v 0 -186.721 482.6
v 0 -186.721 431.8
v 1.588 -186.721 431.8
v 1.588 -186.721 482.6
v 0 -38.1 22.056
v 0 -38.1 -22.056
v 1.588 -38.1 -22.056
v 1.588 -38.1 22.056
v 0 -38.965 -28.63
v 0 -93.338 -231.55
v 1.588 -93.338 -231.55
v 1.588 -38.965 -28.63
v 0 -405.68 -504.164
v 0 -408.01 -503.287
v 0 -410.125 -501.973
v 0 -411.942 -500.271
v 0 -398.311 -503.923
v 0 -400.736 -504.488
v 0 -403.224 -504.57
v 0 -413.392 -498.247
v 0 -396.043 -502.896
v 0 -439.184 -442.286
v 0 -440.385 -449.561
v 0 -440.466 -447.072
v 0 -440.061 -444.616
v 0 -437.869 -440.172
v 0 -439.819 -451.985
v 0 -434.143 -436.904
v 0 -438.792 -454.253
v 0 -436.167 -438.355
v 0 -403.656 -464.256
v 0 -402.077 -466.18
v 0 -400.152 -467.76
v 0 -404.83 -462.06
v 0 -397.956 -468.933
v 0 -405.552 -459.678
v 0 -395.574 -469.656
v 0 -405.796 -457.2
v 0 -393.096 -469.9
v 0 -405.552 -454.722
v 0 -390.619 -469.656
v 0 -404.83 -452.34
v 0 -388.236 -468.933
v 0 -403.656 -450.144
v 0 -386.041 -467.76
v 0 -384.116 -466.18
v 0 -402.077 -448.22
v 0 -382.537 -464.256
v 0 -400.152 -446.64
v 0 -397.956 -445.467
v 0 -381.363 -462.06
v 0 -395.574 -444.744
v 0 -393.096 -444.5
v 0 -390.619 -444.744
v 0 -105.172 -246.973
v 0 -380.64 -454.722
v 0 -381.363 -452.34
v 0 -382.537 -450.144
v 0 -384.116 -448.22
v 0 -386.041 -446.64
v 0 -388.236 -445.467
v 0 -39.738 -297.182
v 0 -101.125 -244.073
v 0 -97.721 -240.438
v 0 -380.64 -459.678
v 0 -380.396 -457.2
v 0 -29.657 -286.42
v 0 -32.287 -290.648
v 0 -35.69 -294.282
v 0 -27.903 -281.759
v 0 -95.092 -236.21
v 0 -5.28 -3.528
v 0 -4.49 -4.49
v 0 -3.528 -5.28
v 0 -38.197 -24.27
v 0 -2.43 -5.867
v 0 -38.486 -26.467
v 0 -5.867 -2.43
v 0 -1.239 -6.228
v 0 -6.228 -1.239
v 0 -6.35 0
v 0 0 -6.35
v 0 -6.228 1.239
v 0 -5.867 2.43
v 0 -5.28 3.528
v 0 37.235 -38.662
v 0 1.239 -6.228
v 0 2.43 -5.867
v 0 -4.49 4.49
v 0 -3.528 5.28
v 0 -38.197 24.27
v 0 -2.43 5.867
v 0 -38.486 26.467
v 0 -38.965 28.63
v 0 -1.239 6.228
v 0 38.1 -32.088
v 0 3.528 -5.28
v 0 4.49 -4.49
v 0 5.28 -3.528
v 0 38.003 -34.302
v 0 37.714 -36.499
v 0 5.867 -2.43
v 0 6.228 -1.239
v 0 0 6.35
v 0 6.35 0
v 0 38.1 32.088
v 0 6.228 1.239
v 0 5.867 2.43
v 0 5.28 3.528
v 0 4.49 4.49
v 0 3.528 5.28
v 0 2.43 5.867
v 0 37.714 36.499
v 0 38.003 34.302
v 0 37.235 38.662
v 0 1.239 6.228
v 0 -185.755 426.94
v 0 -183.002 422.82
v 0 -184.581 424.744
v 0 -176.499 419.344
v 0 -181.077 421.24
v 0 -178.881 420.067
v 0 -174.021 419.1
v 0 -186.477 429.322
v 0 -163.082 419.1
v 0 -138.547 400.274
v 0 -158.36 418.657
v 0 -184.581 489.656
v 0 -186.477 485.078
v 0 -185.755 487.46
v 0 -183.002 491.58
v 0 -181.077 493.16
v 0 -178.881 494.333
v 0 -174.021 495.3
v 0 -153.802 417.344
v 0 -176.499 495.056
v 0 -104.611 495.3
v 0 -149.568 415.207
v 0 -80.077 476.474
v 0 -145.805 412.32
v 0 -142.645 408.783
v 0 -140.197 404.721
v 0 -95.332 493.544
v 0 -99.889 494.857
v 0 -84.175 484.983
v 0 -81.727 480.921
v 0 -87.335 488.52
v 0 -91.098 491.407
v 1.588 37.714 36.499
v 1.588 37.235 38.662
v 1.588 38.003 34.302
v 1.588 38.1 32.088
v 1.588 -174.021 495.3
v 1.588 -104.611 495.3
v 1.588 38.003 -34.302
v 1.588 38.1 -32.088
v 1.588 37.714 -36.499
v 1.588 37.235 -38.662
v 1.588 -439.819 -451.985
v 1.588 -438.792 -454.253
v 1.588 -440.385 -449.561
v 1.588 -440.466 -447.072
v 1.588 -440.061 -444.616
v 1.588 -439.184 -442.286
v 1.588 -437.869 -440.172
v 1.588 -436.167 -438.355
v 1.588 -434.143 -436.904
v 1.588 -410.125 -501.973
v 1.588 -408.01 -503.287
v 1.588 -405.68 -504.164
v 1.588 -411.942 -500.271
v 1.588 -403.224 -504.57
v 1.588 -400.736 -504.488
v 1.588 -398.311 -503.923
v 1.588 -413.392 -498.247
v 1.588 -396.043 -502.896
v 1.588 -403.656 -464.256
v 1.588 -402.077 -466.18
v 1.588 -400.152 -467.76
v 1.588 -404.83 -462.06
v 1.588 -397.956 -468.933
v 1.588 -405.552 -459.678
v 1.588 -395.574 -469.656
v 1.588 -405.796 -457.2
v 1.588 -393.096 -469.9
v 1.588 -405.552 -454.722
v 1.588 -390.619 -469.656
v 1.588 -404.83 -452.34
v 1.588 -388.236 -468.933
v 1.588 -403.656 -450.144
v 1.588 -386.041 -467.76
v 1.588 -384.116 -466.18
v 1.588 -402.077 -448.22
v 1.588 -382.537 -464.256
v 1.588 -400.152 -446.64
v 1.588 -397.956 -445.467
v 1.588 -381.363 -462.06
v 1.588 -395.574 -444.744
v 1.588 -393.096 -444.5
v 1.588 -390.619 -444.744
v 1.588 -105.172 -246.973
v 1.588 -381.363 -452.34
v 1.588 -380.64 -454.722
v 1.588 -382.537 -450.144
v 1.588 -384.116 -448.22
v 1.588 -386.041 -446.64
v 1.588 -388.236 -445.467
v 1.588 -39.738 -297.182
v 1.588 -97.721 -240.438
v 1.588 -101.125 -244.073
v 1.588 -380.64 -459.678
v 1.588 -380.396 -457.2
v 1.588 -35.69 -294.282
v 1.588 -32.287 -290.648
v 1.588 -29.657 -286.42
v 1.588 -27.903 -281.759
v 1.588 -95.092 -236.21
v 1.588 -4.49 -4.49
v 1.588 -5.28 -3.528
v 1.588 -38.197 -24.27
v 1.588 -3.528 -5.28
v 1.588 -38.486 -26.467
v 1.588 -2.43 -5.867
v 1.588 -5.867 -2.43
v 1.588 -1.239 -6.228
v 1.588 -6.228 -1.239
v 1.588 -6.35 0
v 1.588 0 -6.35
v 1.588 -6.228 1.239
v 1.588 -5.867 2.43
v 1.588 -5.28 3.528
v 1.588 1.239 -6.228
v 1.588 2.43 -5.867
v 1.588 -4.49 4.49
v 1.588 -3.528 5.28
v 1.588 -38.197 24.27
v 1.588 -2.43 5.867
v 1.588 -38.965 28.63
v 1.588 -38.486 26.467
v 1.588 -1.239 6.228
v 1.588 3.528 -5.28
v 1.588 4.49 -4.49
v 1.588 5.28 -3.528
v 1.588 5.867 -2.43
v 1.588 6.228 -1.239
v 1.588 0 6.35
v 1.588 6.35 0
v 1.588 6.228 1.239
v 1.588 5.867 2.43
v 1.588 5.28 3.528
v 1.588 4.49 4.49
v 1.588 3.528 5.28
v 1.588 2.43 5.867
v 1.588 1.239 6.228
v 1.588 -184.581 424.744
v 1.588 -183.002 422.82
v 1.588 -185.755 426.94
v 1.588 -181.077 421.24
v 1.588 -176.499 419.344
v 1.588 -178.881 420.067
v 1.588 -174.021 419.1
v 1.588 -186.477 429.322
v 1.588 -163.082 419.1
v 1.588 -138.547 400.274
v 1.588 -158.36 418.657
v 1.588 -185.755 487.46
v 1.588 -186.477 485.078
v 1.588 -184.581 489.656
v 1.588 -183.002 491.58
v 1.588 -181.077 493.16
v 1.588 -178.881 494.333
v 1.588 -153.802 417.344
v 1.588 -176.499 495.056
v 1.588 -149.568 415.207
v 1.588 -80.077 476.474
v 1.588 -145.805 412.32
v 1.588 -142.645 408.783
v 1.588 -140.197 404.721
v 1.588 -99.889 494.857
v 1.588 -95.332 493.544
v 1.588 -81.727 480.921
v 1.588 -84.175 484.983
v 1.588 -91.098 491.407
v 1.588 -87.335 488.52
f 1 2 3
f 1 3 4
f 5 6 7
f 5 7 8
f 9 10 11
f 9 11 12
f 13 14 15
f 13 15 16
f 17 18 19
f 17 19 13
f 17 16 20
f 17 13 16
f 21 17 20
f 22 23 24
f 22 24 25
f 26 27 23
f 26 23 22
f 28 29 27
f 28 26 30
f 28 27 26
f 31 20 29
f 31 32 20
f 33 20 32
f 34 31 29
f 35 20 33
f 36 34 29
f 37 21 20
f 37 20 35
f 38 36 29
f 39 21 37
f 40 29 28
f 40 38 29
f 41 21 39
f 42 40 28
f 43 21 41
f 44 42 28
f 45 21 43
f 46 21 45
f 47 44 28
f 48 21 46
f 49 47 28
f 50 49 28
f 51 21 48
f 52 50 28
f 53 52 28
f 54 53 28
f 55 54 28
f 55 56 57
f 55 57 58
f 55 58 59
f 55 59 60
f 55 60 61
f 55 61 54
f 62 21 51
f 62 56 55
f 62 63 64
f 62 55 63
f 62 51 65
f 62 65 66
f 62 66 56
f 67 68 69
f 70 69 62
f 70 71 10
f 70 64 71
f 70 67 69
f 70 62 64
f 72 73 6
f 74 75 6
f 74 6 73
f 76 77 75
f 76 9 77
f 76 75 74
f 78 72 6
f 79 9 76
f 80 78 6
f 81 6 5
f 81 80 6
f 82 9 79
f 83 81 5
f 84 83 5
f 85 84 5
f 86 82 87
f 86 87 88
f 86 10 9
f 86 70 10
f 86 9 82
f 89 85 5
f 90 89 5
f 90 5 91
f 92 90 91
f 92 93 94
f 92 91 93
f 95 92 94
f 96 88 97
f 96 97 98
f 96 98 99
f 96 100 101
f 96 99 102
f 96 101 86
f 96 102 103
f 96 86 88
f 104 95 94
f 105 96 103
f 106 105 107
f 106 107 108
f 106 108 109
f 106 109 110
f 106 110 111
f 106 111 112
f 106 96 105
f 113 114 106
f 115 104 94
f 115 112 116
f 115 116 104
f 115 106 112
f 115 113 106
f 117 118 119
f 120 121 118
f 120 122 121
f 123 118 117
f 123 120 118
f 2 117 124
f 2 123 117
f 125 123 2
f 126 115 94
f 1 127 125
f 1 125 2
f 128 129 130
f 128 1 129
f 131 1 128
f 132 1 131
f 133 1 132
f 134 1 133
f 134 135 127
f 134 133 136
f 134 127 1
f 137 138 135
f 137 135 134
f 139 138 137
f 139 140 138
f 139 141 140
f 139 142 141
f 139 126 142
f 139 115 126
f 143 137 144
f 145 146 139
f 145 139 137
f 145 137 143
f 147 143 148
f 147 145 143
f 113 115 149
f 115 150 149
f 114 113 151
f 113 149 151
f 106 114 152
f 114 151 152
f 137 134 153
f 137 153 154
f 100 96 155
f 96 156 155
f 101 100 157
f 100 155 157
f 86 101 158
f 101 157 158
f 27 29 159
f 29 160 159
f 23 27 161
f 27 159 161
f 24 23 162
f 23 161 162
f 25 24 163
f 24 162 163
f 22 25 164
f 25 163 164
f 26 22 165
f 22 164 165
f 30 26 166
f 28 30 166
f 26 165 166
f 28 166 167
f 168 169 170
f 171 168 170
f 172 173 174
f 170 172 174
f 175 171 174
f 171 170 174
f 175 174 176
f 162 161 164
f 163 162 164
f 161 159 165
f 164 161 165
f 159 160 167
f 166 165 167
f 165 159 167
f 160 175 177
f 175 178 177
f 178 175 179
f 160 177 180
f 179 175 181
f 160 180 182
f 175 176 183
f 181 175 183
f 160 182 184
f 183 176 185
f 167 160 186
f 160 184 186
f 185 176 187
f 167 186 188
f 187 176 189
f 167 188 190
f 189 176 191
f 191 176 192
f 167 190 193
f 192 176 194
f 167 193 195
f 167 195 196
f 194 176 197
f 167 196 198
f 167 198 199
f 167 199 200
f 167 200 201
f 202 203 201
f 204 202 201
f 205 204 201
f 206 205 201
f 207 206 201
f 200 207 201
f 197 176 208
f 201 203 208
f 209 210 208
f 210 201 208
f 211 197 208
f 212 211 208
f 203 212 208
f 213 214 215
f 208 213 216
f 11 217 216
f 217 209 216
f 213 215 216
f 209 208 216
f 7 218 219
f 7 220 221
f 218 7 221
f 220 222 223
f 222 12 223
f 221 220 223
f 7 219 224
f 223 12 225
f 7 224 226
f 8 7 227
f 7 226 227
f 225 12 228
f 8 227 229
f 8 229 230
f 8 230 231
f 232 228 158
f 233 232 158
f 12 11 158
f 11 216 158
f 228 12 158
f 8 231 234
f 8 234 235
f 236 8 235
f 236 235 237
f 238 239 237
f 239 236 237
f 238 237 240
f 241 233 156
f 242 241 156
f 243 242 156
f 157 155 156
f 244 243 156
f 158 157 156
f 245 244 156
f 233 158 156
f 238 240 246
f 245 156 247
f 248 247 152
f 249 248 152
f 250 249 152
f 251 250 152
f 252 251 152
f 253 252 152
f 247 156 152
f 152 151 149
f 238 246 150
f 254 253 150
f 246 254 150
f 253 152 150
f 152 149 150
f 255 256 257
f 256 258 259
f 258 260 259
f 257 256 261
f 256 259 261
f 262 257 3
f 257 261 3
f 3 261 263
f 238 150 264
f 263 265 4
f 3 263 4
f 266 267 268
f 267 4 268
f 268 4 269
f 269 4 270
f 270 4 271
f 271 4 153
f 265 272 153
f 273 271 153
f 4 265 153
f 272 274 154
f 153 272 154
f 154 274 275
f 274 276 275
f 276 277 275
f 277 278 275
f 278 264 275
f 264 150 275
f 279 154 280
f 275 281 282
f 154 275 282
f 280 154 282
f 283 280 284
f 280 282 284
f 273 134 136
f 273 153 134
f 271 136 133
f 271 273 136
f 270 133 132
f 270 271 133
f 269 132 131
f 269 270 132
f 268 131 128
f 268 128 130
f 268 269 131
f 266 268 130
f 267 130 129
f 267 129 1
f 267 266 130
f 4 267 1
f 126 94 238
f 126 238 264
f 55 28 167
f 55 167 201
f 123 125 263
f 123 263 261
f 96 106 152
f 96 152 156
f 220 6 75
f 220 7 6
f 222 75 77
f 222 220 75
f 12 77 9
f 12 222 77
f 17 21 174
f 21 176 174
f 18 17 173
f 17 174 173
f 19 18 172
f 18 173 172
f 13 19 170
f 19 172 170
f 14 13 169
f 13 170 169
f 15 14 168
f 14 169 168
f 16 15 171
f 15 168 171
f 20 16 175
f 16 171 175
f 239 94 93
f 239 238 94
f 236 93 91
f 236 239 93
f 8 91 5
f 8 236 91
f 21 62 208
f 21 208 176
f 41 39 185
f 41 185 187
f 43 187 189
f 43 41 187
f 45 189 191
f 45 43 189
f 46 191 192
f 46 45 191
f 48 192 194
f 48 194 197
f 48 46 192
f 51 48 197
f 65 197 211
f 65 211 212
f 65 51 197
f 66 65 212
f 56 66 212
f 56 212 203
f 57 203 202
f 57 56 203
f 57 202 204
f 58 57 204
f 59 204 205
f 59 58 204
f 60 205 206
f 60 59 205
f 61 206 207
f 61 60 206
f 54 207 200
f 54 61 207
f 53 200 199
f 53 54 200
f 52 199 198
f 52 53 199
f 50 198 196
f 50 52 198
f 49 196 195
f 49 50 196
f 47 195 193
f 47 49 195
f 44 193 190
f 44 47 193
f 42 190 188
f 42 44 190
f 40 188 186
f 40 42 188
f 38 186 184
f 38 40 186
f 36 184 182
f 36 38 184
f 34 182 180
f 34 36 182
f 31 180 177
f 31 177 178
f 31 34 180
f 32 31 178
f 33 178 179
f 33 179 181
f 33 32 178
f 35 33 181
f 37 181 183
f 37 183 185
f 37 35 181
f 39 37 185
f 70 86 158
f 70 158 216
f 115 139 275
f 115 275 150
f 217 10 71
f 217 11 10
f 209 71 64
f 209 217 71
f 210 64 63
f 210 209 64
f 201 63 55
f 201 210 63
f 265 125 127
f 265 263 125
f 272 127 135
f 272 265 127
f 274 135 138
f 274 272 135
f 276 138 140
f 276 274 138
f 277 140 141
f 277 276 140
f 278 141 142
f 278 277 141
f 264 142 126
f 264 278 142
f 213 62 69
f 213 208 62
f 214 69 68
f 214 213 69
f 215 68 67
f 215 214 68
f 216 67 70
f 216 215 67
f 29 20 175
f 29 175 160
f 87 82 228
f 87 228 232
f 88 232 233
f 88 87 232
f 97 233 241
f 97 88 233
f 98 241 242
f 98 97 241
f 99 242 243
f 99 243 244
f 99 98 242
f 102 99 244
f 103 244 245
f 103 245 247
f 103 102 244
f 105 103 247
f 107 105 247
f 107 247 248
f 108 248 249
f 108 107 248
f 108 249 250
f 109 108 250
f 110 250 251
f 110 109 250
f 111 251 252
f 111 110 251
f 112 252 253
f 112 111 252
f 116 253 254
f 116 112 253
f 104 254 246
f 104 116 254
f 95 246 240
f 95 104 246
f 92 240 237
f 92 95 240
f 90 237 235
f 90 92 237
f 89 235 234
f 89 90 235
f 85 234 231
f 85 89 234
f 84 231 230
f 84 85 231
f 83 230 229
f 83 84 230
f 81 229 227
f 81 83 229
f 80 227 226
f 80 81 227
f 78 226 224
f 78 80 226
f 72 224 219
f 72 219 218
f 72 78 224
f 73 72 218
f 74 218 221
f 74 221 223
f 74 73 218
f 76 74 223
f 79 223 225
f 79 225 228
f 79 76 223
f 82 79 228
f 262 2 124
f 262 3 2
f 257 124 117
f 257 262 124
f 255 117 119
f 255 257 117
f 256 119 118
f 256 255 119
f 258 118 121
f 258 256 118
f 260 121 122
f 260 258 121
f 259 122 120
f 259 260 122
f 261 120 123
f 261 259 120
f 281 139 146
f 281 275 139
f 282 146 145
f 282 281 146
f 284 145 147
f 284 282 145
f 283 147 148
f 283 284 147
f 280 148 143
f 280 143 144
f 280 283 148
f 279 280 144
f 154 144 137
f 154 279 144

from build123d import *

# Parameters (mm, degrees)
SKETCH1_R           = 6.35
SKETCH1_R_2         = 12.7
BOSS_EXTRUDE1_DEPTH = 1.5875
FILLET1_R           = 25.4
FILLET2_R           = 25.4
FILLET3_R           = 25.4
FILLET4_R           = 25.4
FILLET5_R           = 12.7


with BuildPart() as part:
    # Sketch1 → Boss-Extrude1 (new body)
    with BuildSketch(Plane(origin=(0, 0, 0), x_dir=(0, 0, -1), z_dir=(1, 0, 0))):
        Polygon((-35.431920316, 38.1), (35.431920316, 38.1), (291.921947077, -30.626295537), (509.245567884, -407.04184846), (443.254432116, -445.14184846), (241.712348035, -96.060718969), (25.4, -38.1), (-25.4, -38.1), (-419.1, -143.59159706), (-419.1, -186.721280576), (-495.3, -186.721280576), (-495.3, -85.121280576), align=None)
        Circle(SKETCH1_R, mode=Mode.SUBTRACT)
        with Locations((457.2, -393.096280576)):
            Circle(SKETCH1_R_2, mode=Mode.SUBTRACT)
    extrude(amount=BOSS_EXTRUDE1_DEPTH)

    # Fillet1
    fillet1_edges = [part.edges().sort_by_distance(p)[0] for p in [
        (0.79375, -85.121280576, 495.3),
    ]]
    fillet(fillet1_edges, radius=FILLET1_R)

    # Fillet2
    fillet2_edges = [part.edges().sort_by_distance(p)[0] for p in [
        (0.79375, -143.59159706, 419.1),
    ]]
    fillet(fillet2_edges, radius=FILLET2_R)

    # Fillet3
    fillet3_edges = [part.edges().sort_by_distance(p)[0] for p in [
        (0.79375, -96.060718969, -241.712348035),
        (0.79375, -38.1, -25.4),
        (0.79375, -38.1, 25.4),
    ]]
    fillet(fillet3_edges, radius=FILLET3_R)

    # Fillet4
    fillet4_edges = [part.edges().sort_by_distance(p)[0] for p in [
        (0.79375, 38.1, 35.431920316),
        (0.79375, 38.1, -35.431920316),
        (0.79375, -30.626295537, -291.921947077),
    ]]
    fillet(fillet4_edges, radius=FILLET4_R)

    # Fillet5
    fillet5_edges = [part.edges().sort_by_distance(p)[0] for p in [
        (0.79375, -186.721280576, 419.1),
        (0.79375, -186.721280576, 495.3),
        (0.79375, -407.04184846, -509.245567884),
        (0.79375, -445.14184846, -443.254432116),
    ]]
    fillet(fillet5_edges, radius=FILLET5_R)


solid = part.part
